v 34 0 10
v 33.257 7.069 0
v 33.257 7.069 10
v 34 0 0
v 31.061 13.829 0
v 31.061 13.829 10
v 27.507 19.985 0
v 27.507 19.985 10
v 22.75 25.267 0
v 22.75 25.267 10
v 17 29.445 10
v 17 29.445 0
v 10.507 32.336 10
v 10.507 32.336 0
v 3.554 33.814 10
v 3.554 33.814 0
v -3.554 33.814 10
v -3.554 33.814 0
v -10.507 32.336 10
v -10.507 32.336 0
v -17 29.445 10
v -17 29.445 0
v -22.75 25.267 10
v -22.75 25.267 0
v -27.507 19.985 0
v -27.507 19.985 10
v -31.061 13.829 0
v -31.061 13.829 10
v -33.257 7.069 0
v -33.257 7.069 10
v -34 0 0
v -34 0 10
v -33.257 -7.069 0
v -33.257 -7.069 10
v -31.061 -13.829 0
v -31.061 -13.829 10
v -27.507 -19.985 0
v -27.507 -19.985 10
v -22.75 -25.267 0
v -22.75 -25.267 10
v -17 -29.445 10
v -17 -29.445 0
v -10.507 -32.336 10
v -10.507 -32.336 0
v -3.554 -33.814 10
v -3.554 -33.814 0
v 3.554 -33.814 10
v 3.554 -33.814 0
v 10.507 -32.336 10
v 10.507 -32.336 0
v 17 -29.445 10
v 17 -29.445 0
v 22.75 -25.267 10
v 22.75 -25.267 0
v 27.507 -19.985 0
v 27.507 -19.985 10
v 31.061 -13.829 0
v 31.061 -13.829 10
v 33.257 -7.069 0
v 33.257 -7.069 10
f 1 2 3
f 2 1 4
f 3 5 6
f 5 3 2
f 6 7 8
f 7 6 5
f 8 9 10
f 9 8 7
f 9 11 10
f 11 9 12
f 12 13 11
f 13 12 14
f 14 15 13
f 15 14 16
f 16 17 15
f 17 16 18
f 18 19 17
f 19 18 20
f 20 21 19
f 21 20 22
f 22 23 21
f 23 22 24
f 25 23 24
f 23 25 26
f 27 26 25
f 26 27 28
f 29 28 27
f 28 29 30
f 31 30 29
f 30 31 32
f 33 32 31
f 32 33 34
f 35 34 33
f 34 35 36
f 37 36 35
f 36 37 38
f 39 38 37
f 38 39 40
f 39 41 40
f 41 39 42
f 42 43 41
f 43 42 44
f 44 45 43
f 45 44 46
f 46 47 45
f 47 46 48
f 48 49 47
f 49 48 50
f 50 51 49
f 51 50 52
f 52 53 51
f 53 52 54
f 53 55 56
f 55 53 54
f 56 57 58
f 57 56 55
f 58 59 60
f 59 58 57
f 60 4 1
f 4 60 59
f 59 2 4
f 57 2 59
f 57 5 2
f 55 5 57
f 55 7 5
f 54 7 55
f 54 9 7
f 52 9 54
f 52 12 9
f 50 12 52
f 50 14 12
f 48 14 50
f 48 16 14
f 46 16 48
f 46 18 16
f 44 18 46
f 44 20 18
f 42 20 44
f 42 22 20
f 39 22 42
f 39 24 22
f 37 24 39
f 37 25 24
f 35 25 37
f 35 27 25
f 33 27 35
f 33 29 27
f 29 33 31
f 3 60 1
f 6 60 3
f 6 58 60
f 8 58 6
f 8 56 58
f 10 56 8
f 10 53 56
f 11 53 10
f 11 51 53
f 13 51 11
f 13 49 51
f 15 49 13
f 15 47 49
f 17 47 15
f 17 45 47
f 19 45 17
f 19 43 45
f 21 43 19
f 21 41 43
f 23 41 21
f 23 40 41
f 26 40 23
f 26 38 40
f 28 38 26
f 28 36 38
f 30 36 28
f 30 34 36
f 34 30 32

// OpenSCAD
// https://en.wikibooks.org/wiki/OpenSCAD_User_Manual/WIP#Customizer

/* [Drop down box:] */
// combo box for number
Numbers=2; // [0, 1, 2, 3]

// combo box for string
Strings="foo"; // [foo, bar, baz]

//labeled combo box for numbers
Labeled_values=10; // [10:L, 20:M, 30:XL]

//labeled combo box for string
Labeled_value="S"; // [S:Small, M:Medium, L:Large]

/*[ Slider ]*/
// slider widget for number
slider =34; // [10:100]

//step slider for number
stepSlider=2; //[0:5:100]

/* [Checkbox] */

//description
Variable = true;

/*[Spinbox] */

// spinbox with step size 1
Spinbox = 5; 

/* [Textbox] */

//Text box for vector with more than 4 elements
Vector6=[12,34,44,43,23,23];

// Text box for string
String="hello";

/* [Special vector] */
//Text box for vector with less than or equal to 4 elements
Vector1=[12]; //[0:2:50]
Vector2=[12,34]; //[0:2:50]
Vector3=[12,34,46]; //[0:2:50]
Vector4=[12,34,46,24]; //[0:2:50]

cylinder(r = slider, h = 10); 
